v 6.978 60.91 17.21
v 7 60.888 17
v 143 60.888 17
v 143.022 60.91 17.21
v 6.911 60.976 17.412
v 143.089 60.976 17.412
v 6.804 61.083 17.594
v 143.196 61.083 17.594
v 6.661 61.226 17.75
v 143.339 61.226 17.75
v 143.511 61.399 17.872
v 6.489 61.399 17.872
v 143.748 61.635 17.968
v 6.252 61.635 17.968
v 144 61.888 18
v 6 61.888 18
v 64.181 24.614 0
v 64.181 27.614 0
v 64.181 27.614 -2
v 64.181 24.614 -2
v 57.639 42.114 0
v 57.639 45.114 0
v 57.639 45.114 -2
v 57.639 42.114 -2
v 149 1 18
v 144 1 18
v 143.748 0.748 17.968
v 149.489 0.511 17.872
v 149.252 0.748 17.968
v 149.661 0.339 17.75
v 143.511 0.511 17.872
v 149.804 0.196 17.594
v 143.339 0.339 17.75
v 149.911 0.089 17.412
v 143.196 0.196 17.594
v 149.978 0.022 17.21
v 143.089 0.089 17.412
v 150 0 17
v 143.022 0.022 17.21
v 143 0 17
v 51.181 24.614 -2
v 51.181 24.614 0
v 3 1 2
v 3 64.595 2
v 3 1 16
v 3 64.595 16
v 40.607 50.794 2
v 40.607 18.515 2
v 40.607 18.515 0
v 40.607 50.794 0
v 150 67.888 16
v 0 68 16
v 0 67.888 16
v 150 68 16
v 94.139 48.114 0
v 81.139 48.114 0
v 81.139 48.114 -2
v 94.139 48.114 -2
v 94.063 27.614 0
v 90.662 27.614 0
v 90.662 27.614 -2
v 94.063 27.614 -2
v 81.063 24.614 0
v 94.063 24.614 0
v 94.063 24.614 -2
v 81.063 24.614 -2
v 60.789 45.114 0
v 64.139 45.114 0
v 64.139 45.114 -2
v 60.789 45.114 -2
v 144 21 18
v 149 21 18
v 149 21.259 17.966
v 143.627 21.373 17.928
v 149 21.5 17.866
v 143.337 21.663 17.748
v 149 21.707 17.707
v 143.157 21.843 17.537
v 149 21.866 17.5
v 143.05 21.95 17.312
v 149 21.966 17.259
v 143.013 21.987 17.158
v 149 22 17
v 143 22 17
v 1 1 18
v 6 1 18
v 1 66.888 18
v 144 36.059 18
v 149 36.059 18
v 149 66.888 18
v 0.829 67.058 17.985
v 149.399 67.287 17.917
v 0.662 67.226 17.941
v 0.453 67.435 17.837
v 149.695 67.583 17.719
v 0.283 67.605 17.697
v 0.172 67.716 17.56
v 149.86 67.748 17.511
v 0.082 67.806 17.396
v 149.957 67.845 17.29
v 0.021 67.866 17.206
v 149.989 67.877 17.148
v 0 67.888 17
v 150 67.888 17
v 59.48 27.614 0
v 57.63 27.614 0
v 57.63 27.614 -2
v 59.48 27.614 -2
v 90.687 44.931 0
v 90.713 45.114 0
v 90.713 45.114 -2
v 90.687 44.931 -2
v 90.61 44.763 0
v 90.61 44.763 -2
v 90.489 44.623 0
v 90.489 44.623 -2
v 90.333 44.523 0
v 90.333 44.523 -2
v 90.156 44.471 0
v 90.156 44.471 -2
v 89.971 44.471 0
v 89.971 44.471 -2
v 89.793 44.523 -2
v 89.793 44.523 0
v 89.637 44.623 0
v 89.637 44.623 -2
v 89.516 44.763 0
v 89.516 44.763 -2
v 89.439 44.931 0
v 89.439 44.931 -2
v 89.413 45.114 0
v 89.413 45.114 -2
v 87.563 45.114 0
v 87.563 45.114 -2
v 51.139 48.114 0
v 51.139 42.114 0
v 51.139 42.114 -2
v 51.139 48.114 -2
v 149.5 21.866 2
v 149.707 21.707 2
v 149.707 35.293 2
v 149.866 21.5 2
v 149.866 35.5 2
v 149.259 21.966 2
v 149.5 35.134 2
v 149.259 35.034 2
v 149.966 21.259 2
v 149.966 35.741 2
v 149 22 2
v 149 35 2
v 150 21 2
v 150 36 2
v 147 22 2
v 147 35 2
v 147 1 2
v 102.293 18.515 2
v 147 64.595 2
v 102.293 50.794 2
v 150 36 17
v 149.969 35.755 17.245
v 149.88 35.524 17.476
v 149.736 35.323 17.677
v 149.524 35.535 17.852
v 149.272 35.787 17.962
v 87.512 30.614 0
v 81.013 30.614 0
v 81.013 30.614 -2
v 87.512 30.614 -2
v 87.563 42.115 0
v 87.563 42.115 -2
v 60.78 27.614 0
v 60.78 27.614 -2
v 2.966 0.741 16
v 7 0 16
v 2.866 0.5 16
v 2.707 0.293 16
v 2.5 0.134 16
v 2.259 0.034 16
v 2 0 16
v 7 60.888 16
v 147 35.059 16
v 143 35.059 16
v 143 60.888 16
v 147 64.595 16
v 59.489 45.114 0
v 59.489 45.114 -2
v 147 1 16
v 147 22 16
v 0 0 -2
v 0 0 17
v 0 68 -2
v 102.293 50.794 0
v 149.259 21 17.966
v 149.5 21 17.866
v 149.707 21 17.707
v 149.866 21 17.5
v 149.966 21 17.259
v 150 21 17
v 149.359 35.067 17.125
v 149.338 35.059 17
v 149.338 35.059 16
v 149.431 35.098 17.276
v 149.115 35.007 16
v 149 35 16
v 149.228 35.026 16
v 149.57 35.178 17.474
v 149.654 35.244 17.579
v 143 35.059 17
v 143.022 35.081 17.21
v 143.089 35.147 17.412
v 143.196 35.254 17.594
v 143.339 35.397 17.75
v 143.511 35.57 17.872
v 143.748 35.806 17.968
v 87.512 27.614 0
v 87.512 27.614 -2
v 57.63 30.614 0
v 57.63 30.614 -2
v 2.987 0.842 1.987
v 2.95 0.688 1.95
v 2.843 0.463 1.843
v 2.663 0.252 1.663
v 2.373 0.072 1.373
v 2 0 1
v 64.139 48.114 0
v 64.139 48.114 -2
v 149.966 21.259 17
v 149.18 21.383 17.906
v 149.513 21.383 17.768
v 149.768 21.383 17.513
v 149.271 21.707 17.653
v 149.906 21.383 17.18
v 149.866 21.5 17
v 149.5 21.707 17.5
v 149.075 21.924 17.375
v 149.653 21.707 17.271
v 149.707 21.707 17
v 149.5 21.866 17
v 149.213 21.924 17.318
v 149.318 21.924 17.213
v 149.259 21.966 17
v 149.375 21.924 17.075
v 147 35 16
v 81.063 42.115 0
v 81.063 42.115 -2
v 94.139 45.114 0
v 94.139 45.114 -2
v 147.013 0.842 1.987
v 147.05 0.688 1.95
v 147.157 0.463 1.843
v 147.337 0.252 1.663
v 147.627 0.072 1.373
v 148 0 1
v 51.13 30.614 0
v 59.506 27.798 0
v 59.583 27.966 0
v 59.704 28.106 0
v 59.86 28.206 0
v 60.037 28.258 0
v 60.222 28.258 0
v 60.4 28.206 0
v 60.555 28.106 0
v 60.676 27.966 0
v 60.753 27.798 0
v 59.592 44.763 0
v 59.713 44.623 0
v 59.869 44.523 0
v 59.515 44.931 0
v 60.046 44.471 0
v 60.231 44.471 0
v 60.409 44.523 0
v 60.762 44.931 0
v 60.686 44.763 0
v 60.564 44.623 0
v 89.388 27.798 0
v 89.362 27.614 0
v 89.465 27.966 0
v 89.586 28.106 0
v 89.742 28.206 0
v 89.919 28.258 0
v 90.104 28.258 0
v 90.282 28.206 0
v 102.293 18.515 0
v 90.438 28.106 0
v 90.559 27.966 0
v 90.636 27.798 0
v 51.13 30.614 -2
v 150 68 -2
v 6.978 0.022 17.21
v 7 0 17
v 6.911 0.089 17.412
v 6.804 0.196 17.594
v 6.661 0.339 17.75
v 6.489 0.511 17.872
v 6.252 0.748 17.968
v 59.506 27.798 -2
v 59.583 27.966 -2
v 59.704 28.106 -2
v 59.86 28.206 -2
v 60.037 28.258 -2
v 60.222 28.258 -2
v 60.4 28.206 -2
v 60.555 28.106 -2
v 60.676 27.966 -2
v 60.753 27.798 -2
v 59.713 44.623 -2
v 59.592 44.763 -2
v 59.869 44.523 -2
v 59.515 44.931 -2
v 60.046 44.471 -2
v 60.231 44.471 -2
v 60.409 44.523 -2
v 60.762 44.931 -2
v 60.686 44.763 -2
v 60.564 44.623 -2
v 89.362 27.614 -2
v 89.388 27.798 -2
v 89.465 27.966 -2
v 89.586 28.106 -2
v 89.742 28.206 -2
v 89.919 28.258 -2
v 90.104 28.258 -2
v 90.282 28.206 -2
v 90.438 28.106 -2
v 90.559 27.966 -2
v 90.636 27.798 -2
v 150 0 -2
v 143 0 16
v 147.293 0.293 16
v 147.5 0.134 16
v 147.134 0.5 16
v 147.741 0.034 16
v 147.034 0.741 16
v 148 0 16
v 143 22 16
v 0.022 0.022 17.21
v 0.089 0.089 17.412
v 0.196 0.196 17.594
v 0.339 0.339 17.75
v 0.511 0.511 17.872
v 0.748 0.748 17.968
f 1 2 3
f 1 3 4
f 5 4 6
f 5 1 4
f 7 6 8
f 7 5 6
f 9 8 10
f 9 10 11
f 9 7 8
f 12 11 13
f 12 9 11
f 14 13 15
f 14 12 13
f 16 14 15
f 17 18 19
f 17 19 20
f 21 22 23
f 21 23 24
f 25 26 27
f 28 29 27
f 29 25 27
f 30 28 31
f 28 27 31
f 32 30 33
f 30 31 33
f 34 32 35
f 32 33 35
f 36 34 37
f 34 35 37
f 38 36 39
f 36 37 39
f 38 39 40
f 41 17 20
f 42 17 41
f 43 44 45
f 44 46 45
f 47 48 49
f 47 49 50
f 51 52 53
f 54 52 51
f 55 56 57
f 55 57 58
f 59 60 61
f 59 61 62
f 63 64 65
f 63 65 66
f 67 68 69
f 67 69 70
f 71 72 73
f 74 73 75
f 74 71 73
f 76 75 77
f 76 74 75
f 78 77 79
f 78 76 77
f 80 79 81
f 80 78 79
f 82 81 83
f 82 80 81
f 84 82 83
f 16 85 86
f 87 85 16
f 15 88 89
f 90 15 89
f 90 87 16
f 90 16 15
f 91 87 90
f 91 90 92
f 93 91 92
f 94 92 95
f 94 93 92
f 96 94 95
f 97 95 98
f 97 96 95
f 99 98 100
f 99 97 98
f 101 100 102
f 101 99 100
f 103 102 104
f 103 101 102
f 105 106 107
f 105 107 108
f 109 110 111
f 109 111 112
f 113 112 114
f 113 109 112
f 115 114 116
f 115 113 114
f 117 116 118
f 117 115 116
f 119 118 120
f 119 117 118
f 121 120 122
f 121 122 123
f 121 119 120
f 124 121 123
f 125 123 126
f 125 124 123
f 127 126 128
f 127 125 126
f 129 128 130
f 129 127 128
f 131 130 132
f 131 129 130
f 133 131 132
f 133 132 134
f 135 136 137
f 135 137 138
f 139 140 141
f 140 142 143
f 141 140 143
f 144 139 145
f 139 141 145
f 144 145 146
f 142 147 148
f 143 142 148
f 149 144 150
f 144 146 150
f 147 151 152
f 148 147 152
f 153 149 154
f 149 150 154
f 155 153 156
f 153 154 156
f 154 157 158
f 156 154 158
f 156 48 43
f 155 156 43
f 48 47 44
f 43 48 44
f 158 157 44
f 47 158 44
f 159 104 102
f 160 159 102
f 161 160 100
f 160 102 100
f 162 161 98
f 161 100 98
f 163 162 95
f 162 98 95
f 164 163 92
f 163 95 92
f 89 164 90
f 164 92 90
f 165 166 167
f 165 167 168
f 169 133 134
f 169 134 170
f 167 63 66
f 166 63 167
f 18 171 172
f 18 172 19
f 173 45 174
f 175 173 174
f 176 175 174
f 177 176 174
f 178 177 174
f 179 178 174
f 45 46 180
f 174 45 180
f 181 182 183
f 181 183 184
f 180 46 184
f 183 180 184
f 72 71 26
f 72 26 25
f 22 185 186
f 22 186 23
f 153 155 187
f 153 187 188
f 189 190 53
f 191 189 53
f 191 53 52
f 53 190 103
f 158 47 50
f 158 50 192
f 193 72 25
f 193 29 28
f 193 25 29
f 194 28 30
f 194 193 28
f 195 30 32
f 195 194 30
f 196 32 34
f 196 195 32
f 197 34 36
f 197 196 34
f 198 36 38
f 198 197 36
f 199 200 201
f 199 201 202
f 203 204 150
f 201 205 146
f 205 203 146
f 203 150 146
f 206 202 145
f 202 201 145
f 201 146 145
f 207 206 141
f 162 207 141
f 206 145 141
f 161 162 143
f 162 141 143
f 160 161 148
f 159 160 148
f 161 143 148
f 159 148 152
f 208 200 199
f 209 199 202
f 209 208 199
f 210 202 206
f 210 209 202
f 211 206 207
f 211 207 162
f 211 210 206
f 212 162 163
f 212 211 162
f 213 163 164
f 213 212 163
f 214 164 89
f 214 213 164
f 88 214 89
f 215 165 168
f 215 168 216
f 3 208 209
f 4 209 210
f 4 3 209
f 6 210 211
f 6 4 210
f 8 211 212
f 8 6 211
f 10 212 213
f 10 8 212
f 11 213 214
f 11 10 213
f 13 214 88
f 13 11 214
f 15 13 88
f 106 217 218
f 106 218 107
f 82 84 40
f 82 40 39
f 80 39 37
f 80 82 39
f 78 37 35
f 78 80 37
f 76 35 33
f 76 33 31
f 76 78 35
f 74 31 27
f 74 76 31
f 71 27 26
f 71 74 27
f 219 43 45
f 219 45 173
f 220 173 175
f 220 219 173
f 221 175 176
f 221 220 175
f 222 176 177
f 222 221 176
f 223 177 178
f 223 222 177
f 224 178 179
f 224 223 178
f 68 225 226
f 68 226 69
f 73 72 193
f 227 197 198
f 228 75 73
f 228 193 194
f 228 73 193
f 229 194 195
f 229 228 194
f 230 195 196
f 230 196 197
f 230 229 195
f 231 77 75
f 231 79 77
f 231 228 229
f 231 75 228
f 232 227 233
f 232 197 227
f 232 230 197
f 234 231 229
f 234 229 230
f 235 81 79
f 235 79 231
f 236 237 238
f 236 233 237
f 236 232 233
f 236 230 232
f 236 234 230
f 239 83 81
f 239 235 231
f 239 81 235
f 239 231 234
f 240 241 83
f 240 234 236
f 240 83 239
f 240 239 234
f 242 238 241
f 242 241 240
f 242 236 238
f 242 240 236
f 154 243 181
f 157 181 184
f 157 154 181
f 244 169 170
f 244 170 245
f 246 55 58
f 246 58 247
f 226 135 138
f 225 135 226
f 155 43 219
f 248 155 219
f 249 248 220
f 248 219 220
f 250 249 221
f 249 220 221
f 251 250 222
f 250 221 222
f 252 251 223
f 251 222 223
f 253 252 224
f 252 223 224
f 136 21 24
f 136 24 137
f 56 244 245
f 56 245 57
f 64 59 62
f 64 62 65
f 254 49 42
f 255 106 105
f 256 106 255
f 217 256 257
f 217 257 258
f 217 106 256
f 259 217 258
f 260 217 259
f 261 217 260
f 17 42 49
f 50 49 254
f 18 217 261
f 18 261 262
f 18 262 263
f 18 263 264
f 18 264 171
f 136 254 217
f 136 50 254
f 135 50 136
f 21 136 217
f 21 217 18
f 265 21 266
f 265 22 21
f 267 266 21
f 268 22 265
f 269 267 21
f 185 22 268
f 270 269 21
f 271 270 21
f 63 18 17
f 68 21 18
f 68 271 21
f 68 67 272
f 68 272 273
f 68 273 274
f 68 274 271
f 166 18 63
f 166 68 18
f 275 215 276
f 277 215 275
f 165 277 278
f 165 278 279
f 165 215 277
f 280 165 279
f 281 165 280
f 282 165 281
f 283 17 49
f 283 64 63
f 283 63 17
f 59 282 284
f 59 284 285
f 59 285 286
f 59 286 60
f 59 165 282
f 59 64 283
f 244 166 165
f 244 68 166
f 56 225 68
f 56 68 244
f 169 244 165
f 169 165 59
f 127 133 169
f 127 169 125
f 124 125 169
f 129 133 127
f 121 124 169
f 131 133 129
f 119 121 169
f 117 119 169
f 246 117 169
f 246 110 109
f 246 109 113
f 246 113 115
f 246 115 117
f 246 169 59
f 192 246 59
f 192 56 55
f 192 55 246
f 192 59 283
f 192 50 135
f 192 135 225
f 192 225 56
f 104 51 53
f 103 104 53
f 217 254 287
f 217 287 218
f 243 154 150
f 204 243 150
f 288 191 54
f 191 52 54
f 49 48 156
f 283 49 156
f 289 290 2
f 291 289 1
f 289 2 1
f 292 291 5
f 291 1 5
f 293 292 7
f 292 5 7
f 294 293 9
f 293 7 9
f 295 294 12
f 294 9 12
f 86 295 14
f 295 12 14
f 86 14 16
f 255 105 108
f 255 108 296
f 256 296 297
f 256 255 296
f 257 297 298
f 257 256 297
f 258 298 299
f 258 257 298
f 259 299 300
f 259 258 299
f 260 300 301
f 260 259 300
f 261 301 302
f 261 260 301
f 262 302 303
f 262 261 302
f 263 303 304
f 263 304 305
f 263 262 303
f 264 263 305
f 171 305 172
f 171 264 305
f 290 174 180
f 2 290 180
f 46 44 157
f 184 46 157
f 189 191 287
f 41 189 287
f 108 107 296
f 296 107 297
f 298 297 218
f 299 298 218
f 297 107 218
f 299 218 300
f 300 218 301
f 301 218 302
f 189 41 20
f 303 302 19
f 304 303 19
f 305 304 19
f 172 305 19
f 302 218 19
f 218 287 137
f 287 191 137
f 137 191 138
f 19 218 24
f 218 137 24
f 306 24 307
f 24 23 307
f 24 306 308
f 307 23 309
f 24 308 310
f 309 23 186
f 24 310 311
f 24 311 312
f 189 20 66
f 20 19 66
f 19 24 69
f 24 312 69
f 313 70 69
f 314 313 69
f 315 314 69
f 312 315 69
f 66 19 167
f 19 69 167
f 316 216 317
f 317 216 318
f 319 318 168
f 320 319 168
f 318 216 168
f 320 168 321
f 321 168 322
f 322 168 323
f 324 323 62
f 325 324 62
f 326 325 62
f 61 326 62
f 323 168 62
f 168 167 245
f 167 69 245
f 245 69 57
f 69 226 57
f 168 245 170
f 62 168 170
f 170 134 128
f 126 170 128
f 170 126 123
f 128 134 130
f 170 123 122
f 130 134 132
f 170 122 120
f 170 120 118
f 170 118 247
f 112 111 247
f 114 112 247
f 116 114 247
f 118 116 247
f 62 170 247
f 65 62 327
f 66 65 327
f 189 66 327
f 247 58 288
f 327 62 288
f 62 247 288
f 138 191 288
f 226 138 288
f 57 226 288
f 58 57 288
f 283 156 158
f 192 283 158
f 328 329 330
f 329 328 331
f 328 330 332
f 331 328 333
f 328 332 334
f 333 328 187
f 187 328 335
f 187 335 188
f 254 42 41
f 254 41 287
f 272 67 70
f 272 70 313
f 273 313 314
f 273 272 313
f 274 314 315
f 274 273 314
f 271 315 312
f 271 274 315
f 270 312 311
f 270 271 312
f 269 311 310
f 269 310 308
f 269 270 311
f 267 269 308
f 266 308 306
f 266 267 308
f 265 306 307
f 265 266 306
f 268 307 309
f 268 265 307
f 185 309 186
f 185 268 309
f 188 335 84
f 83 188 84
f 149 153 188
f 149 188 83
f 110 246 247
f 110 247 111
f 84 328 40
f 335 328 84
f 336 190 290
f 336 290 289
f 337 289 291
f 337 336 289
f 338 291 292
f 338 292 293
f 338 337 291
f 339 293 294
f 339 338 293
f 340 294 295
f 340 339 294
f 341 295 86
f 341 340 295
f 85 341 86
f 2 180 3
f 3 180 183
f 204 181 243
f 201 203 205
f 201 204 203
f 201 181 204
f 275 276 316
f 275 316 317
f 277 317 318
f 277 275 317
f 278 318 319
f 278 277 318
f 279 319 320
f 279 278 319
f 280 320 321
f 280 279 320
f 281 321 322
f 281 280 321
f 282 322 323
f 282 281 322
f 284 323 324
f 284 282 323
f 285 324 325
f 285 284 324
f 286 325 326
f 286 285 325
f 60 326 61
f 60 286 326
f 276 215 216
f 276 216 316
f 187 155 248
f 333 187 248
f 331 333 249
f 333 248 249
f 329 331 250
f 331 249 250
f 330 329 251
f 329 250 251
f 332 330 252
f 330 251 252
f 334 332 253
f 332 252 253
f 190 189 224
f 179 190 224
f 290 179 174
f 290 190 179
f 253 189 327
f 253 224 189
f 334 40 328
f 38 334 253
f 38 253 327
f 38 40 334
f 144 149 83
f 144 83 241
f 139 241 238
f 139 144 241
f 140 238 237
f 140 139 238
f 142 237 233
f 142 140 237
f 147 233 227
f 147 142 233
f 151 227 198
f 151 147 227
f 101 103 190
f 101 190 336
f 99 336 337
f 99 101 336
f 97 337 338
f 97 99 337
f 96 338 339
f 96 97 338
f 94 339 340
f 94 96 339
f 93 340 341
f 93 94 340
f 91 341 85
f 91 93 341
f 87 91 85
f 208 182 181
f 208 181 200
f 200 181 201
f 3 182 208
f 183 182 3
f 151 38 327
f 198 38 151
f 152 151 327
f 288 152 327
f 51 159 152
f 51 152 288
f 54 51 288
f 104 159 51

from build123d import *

# Parameters (mm, degrees)
F0_W         = 150
F0_H         = 68
F0_W_2       = 61.6867046999
F0_H_2       = 32.2795761846
F1_DEPTH     = 2
F2_W         = 3
F2_H         = 3.4045838118
F2_W_2       = 144
F2_H_2       = 64.5954161882
F2_H_3       = 29.5954161882
F2_H_4       = 22
F3_DEPTH     = 14
F4_W         = 4.8811412584
F4_H         = 7
F4_W_2       = 136
F4_W_3       = 7
F4_H_2       = 25.8289493918
F4_H_3       = 22
F5_DEPTH     = 2
F6_T1_DEPTH  = 72.8877383471
F6_T3_DEPTH  = 12
F6_T5_DEPTH  = 63.3877383471
F6_T7_DEPTH  = 136
F6_T9_DEPTH  = 28.3289493918
F6_T11_DEPTH = 12
F6_T13_DEPTH = 37.8289493918
F6_T15_DEPTH = 155
F6_T17_DEPTH = 23.5
F6_T19_DEPTH = 8.5
F6_T21_DEPTH = 27
F6_T23_DEPTH = 144
F6_T25_DEPTH = 14
F6_T27_DEPTH = 15
F6_T29_DEPTH = 16.5
F6_S33_W     = 1
F6_S33_H     = 1
F6_T34_DEPTH = 1
F6_T41_DEPTH = 65.8877383471
F6_T45_DEPTH = 138.5
F6_T52_DEPTH = 138.5
F6_T56_DEPTH = 30.8289493918
F6_T63_DEPTH = 146.5
F6_T67_DEPTH = 16.5
F6_T74_DEPTH = 146.5
F6_T78_DEPTH = 16.5
F7_W         = 150
F7_H         = 68
F7_W_2       = 61.6867046999
F7_H_2       = 32.2795761846
F8_DEPTH     = 2
F9_W         = 73.8973718075
F9_H         = 39.0960725045
F9_W_2       = 61.6867046999
F9_H_2       = 32.2795761846
F10_DEPTH    = 2


# Not quite as in the source:
# - a fillet or chamfer that OpenCascade refuses, or shapes differently, is made with other operations: its cross-section is extruded or revolved along the edge and cut away or added
# - a feature names something its author has since deleted; it is built from what else it names


with BuildPart() as f1:
    # F0 (on Top) → F1 (new body)
    with BuildSketch(Plane.XY):
        with Locations((75, 34)):
            Rectangle(F0_W, F0_H)
        with Locations((71.4499814534, 34.6545311671)):
            Rectangle(F0_W_2, F0_H_2, mode=Mode.SUBTRACT)
    extrude(amount=F1_DEPTH)

    # F2 (on face) → F3 (join)
    with BuildSketch(Plane.XY.offset(2)):
        with Locations((1.5, 66.2977080941)):
            Rectangle(F2_W, F2_H)
        with Locations((75, 66.2977080941)):
            Rectangle(F2_W_2, F2_H)
        with Locations((1.5, 32.2977080941)):
            Rectangle(F2_W, F2_H_2)
        with Locations((148.5, 66.2977080941)):
            Rectangle(F2_W, F2_H)
        with Locations((148.5, 49.7977080941)):
            Rectangle(F2_W, F2_H_3)
        with Locations((148.5, 11)):
            Rectangle(F2_W, F2_H_4)
    extrude(amount=F3_DEPTH)

    # F4 (on face) → F5 (join)
    with BuildSketch(Plane.XY.offset(16)):
        Polygon((0, 67.8877383471), (0, 0), (7, 0), (7, 60.8877383471), (2.1188587416, 60.8877383471), (2.1188587416, 67.8877383471), align=None)
        with Locations((4.5594293708, 64.3877383471)):
            Rectangle(F4_W, F4_H)
        with Locations((75, 64.3877383471)):
            Rectangle(F4_W_2, F4_H)
        with Locations((146.5, 64.3877383471)):
            Rectangle(F4_W_3, F4_H)
        with Locations((146.5, 47.9732636511)):
            Rectangle(F4_W_3, F4_H_2)
        with Locations((146.5, 11)):
            Rectangle(F4_W_3, F4_H_3)
    extrude(amount=F5_DEPTH)

    # F6: fillet of radius 1 on 17 edges, made by hand

    # F6_s2 → F6_t1 (cut)
    with BuildSketch(Plane.XZ.offset(-70.3877383471)):
        with BuildLine():
            ThreePointArc((0, 17), (0.2928932188, 17.7071067812), (1, 18))
            Line((1, 18), (0, 18))
            Line((0, 18), (0, 17))
        make_face()
    extrude(amount=F6_T1_DEPTH, mode=Mode.SUBTRACT)

    # F6_s4 → F6_t3 (cut)
    with BuildSketch(Plane.YZ.offset(-2.5)):
        with BuildLine():
            ThreePointArc((0, 17), (0.2928932188, 17.7071067812), (1, 18))
            Line((1, 18), (0, 18))
            Line((0, 18), (0, 17))
        make_face()
    extrude(amount=F6_T3_DEPTH, mode=Mode.SUBTRACT)

    # F6_s6 → F6_t5 (cut)
    with BuildSketch(Plane.XZ.offset(-60.8877383471)):
        with BuildLine():
            ThreePointArc((7, 17), (6.7071067812, 17.7071067812), (6, 18))
            Line((6, 18), (7, 18))
            Line((7, 18), (7, 17))
        make_face()
    extrude(amount=F6_T5_DEPTH, mode=Mode.SUBTRACT)

    # F6_s8 → F6_t7 (cut)
    with BuildSketch(Plane.YZ.offset(7)):
        with BuildLine():
            ThreePointArc((60.8877383471, 17), (61.1806315659, 17.7071067812), (61.8877383471, 18))
            Line((61.8877383471, 18), (60.8877383471, 18))
            Line((60.8877383471, 18), (60.8877383471, 17))
        make_face()
    extrude(amount=F6_T7_DEPTH, mode=Mode.SUBTRACT)

    # F6_s10 → F6_t9 (cut)
    with BuildSketch(Plane.XZ.offset(-60.8877383471)):
        with BuildLine():
            ThreePointArc((143, 17), (143.2928932188, 17.7071067812), (144, 18))
            Line((144, 18), (143, 18))
            Line((143, 18), (143, 17))
        make_face()
    extrude(amount=F6_T9_DEPTH, mode=Mode.SUBTRACT)

    # F6_s12 → F6_t11 (cut)
    with BuildSketch(Plane.YZ.offset(140.5)):
        with BuildLine():
            ThreePointArc((35.0587889552, 17), (35.351682174, 17.7071067812), (36.0587889552, 18))
            Line((36.0587889552, 18), (35.0587889552, 18))
            Line((35.0587889552, 18), (35.0587889552, 17))
        make_face()
        with BuildLine():
            ThreePointArc((1, 18), (0.2928932188, 17.7071067812), (0, 17))
            Line((0, 17), (0, 18))
            Line((0, 18), (1, 18))
        make_face()
    extrude(amount=F6_T11_DEPTH, mode=Mode.SUBTRACT)

    # F6_s14 → F6_t13 (cut)
    with BuildSketch(Plane.XZ.offset(-70.3877383471)):
        with BuildLine():
            ThreePointArc((150, 17), (149.7071067812, 17.7071067812), (149, 18))
            Line((149, 18), (150, 18))
            Line((150, 18), (150, 17))
        make_face()
    extrude(amount=F6_T13_DEPTH, mode=Mode.SUBTRACT)

    # F6_s16 → F6_t15 (cut)
    with BuildSketch(Plane.YZ.offset(-2.5)):
        with BuildLine():
            ThreePointArc((66.8877383471, 18), (67.5948451282, 17.7071067812), (67.8877383471, 17))
            Line((67.8877383471, 17), (67.8877383471, 18))
            Line((67.8877383471, 18), (66.8877383471, 18))
        make_face()
    extrude(amount=F6_T15_DEPTH, mode=Mode.SUBTRACT)

    # F6_s18 → F6_t17 (cut)
    with BuildSketch(Plane.XZ.offset(-21)):
        with BuildLine():
            ThreePointArc((149, 18), (149.7071067812, 17.7071067812), (150, 17))
            Line((150, 17), (150, 18))
            Line((150, 18), (149, 18))
        make_face()
    extrude(amount=F6_T17_DEPTH, mode=Mode.SUBTRACT)

    # F6_s20 → F6_t19 (cut)
    with BuildSketch(Plane.YZ.offset(140.5)):
        with BuildLine():
            ThreePointArc((21, 18), (21.7071067812, 17.7071067812), (22, 17))
            Line((22, 17), (22, 18))
            Line((22, 18), (21, 18))
        make_face()
    extrude(amount=F6_T19_DEPTH, mode=Mode.SUBTRACT)

    # F6_s22 → F6_t21 (cut)
    with BuildSketch(Plane.XZ.offset(-24.5)):
        with BuildLine():
            ThreePointArc((143, 17), (143.2928932188, 17.7071067812), (144, 18))
            Line((144, 18), (143, 18))
            Line((143, 18), (143, 17))
        make_face()
    extrude(amount=F6_T21_DEPTH, mode=Mode.SUBTRACT)

    # F6_s24 → F6_t23 (cut)
    with BuildSketch(Plane.YZ.offset(3)):
        with BuildLine():
            ThreePointArc((1, 2), (0.2928932188, 1.7071067812), (0, 1))
            Line((0, 1), (0, 2))
            Line((0, 2), (1, 2))
        make_face()
    extrude(amount=F6_T23_DEPTH, mode=Mode.SUBTRACT)

    # F6_s26 → F6_t25 (cut)
    with BuildSketch(Plane.XY.offset(2)):
        with BuildLine():
            ThreePointArc((3, 1), (2.7071067812, 0.2928932188), (2, 0))
            Line((2, 0), (3, 0))
            Line((3, 0), (3, 1))
        make_face()
        with BuildLine():
            ThreePointArc((147, 1), (147.2928932188, 0.2928932188), (148, 0))
            Line((148, 0), (147, 0))
            Line((147, 0), (147, 1))
        make_face()
    extrude(amount=F6_T25_DEPTH, mode=Mode.SUBTRACT)

    # F6_s28 → F6_t27 (cut)
    with BuildSketch(Plane.XY.offset(2)):
        with BuildLine():
            ThreePointArc((149, 22), (149.7071067812, 21.7071067812), (150, 21))
            Line((150, 21), (150, 22))
            Line((150, 22), (149, 22))
        make_face()
    extrude(amount=F6_T27_DEPTH, mode=Mode.SUBTRACT)

    # F6_s30 → F6_t29 (cut)
    with BuildSketch(Plane.XY.offset(2)):
        with BuildLine():
            ThreePointArc((149, 35), (149.7071067812, 35.2928932188), (150, 36))
            Line((150, 36), (150, 35))
            Line((150, 35), (149, 35))
        make_face()
    extrude(amount=F6_T29_DEPTH, mode=Mode.SUBTRACT)


with BuildPart() as f6_tool32:
    # F6_s33 → F6_t34 (new body)
    with BuildSketch(Plane.XZ.offset(-21)):
        with Locations((149.5, 17.5)):
            Rectangle(F6_S33_W, F6_S33_H)
    extrude(amount=-F6_T34_DEPTH)

    # F6_s35 → F6_t36 (revolve, cut)
    with BuildSketch(Plane(origin=(149, 21, 17), x_dir=(-0.7071067812, 0, -0.7071067812), z_dir=(0.7071067812, 0, -0.7071067812))):
        with BuildLine():
            ThreePointArc((0, -1), (1, 0), (0, 1))
            Line((0, 1), (0, -1))
        make_face()
    revolve(axis=Axis((149, 21, 17), (0, 1, 0)), mode=Mode.SUBTRACT)


with BuildPart() as f1_1:
    add(f1.part)

    # F6_t31: cut F6_tool32
    add(f6_tool32.part, mode=Mode.SUBTRACT)


with BuildPart() as f6_tool39:
    # F6_s40 → F6_t41 (new body)
    with BuildSketch(Plane.XZ.offset(2.5)):
        with BuildLine():
            ThreePointArc((7, 17), (6.7071067812, 17.7071067812), (6, 18))
            Line((6, 18), (7, 18))
            Line((7, 18), (7, 17))
        make_face()
    extrude(amount=-F6_T41_DEPTH)

    split(bisect_by=Plane.XZ.offset(-60.8877383471), keep=Keep.BOTTOM)


with BuildPart() as f6_tool43:
    # F6_s44 → F6_t45 (new body)
    with BuildSketch(Plane.YZ.offset(4.5)):
        with BuildLine():
            ThreePointArc((60.8877383471, 17), (61.1806315659, 17.7071067812), (61.8877383471, 18))
            Line((61.8877383471, 18), (60.8877383471, 18))
            Line((60.8877383471, 18), (60.8877383471, 17))
        make_face()
    extrude(amount=F6_T45_DEPTH)

    split(bisect_by=Plane.YZ.offset(7), keep=Keep.BOTTOM)


with BuildPart() as f6_tool39_1:
    add(f6_tool39.part)

    # F6_t47: intersect F6_tool43
    add(f6_tool43.part, mode=Mode.INTERSECT)


with BuildPart() as f1_2:
    add(f1_1.part)

    # F6_t37: cut F6_tool39
    add(f6_tool39_1.part, mode=Mode.SUBTRACT)


with BuildPart() as f6_tool50:
    # F6_s51 → F6_t52 (new body)
    with BuildSketch(Plane.YZ.offset(7)):
        with BuildLine():
            ThreePointArc((60.8877383471, 17), (61.1806315659, 17.7071067812), (61.8877383471, 18))
            Line((61.8877383471, 18), (60.8877383471, 18))
            Line((60.8877383471, 18), (60.8877383471, 17))
        make_face()
    extrude(amount=F6_T52_DEPTH)

    split(bisect_by=Plane.YZ.offset(143), keep=Keep.TOP)


with BuildPart() as f6_tool54:
    # F6_s55 → F6_t56 (new body)
    with BuildSketch(Plane.XZ.offset(-63.3877383471)):
        with BuildLine():
            ThreePointArc((143, 17), (143.2928932188, 17.7071067812), (144, 18))
            Line((144, 18), (143, 18))
            Line((143, 18), (143, 17))
        make_face()
    extrude(amount=F6_T56_DEPTH)

    split(bisect_by=Plane.XZ.offset(-60.8877383471), keep=Keep.BOTTOM)


with BuildPart() as f6_tool50_1:
    add(f6_tool50.part)

    # F6_t58: intersect F6_tool54
    add(f6_tool54.part, mode=Mode.INTERSECT)


with BuildPart() as f1_3:
    add(f1_2.part)

    # F6_t48: cut F6_tool50
    add(f6_tool50_1.part, mode=Mode.SUBTRACT)


with BuildPart() as f6_tool61:
    # F6_s62 → F6_t63 (new body)
    with BuildSketch(Plane.YZ.offset(0.5)):
        with BuildLine():
            ThreePointArc((1, 2), (0.2928932188, 1.7071067812), (0, 1))
            Line((0, 1), (0, 2))
            Line((0, 2), (1, 2))
        make_face()
    extrude(amount=F6_T63_DEPTH)

    split(bisect_by=Plane.YZ.offset(3), keep=Keep.BOTTOM)


with BuildPart() as f6_tool65:
    # F6_s66 → F6_t67 (new body)
    with BuildSketch(Plane.XY.offset(-0.5)):
        with BuildLine():
            ThreePointArc((3, 1), (2.7071067812, 0.2928932188), (2, 0))
            Line((2, 0), (3, 0))
            Line((3, 0), (3, 1))
        make_face()
    extrude(amount=F6_T67_DEPTH)

    split(bisect_by=Plane.XY.offset(2), keep=Keep.BOTTOM)


with BuildPart() as f6_tool61_1:
    add(f6_tool61.part)

    # F6_t69: intersect F6_tool65
    add(f6_tool65.part, mode=Mode.INTERSECT)


with BuildPart() as f1_4:
    add(f1_3.part)

    # F6_t59: cut F6_tool61
    add(f6_tool61_1.part, mode=Mode.SUBTRACT)


with BuildPart() as f6_tool72:
    # F6_s73 → F6_t74 (new body)
    with BuildSketch(Plane.YZ.offset(3)):
        with BuildLine():
            ThreePointArc((1, 2), (0.2928932188, 1.7071067812), (0, 1))
            Line((0, 1), (0, 2))
            Line((0, 2), (1, 2))
        make_face()
    extrude(amount=F6_T74_DEPTH)

    split(bisect_by=Plane.YZ.offset(147), keep=Keep.TOP)


with BuildPart() as f6_tool76:
    # F6_s77 → F6_t78 (new body)
    with BuildSketch(Plane.XY.offset(-0.5)):
        with BuildLine():
            ThreePointArc((147, 1), (147.2928932188, 0.2928932188), (148, 0))
            Line((148, 0), (147, 0))
            Line((147, 0), (147, 1))
        make_face()
    extrude(amount=F6_T78_DEPTH)

    split(bisect_by=Plane.XY.offset(2), keep=Keep.BOTTOM)


with BuildPart() as f6_tool72_1:
    add(f6_tool72.part)

    # F6_t80: intersect F6_tool76
    add(f6_tool76.part, mode=Mode.INTERSECT)


with BuildPart() as f1_5:
    add(f1_4.part)

    # F6_t70: cut F6_tool72
    add(f6_tool72_1.part, mode=Mode.SUBTRACT)

    # F7 (on face) → F8 (join)
    with BuildSketch(Plane.XY):
        with Locations((75, 34)):
            Rectangle(F7_W, F7_H)
        with Locations((71.4499814534, 34.6545311671)):
            Rectangle(F7_W_2, F7_H_2, mode=Mode.SUBTRACT)
    extrude(amount=-F8_DEPTH)

    # F9 (on face) → F10 (join)
    with BuildSketch(Plane.XY):
        with Locations((72.7380400409, 34.5662031323)):
            Rectangle(F9_W, F9_H)
        with Locations((71.4499814534, 34.6545311671)):
            Rectangle(F9_W_2, F9_H_2, mode=Mode.SUBTRACT)
        with Locations((71.4499814534, 34.6545311671)):
            Rectangle(F9_W_2, F9_H_2)
        with BuildLine():
            Line((64.1806087643, 24.6144512218), (51.1806087643, 24.6144512218))
            Line((51.1806087643, 24.6144512218), (51.1301904917, 30.6142393845))
            Line((51.1301904917, 30.6142393845), (57.6295237077, 30.6142393845))
            Line((57.6295237077, 30.6142393845), (57.6295237077, 27.6144512218))
            Line((57.6295237077, 27.6144512218), (59.4795237077, 27.6144512218))
            ThreePointArc((59.4795237077, 27.6144512218), (60.1295237077, 28.2644512218), (60.7795237077, 27.6144512218))
            Line((60.7795237077, 27.6144512218), (64.1806087643, 27.6144512218))
            Line((64.1806087643, 27.6144512218), (64.1806087643, 24.6144512218))
        make_face(mode=Mode.SUBTRACT)
        with BuildLine():
            Line((94.0630321503, 24.6144512218), (81.0630321503, 24.6144512218))
            Line((81.0630321503, 24.6144512218), (81.0126138777, 30.6142393845))
            Line((81.0126138777, 30.6142393845), (87.5119470937, 30.6142393845))
            Line((87.5119470937, 30.6142393845), (87.5119470937, 27.6144512218))
            Line((87.5119470937, 27.6144512218), (89.3619470937, 27.6144512218))
            ThreePointArc((89.3619470937, 27.6144512218), (90.0119470937, 28.2644512218), (90.6619470937, 27.6144512218))
            Line((90.6619470937, 27.6144512218), (94.0630321503, 27.6144512218))
            Line((94.0630321503, 27.6144512218), (94.0630321503, 24.6144512218))
        make_face(mode=Mode.SUBTRACT)
        with BuildLine():
            Line((51.1387947655, 42.1142393845), (51.1387947655, 48.1142393845))
            Line((51.1387947655, 48.1142393845), (64.1387947655, 48.1142393845))
            Line((64.1387947655, 48.1142393845), (64.1387947655, 45.1142393845))
            Line((64.1387947655, 45.1142393845), (60.7887947655, 45.1142393845))
            ThreePointArc((60.7887947655, 45.1142393845), (60.1387947655, 44.4642393845), (59.4887947655, 45.1142393845))
            Line((59.4887947655, 45.1142393845), (57.6387947655, 45.1142393845))
            Line((57.6387947655, 45.1142393845), (57.6387947655, 42.1142393845))
            Line((57.6387947655, 42.1142393845), (51.1387947655, 42.1142393845))
        make_face(mode=Mode.SUBTRACT)
        with BuildLine():
            Line((81.063032589, 42.1147177292), (81.1387947655, 48.1142393845))
            Line((81.1387947655, 48.1142393845), (94.1387947655, 48.1142393845))
            Line((94.1387947655, 48.1142393845), (94.1387947655, 45.1142393845))
            Line((94.1387947655, 45.1142393845), (90.713032589, 45.1142393845))
            ThreePointArc((90.713032589, 45.1142393845), (90.063032589, 44.4642393845), (89.413032589, 45.1142393845))
            Line((89.413032589, 45.1142393845), (87.563032589, 45.1142393845))
            Line((87.563032589, 45.1142393845), (87.563032589, 42.1147177292))
            Line((87.563032589, 42.1147177292), (81.063032589, 42.1147177292))
        make_face(mode=Mode.SUBTRACT)
    extrude(amount=-F10_DEPTH)


solid = f1_5.part
